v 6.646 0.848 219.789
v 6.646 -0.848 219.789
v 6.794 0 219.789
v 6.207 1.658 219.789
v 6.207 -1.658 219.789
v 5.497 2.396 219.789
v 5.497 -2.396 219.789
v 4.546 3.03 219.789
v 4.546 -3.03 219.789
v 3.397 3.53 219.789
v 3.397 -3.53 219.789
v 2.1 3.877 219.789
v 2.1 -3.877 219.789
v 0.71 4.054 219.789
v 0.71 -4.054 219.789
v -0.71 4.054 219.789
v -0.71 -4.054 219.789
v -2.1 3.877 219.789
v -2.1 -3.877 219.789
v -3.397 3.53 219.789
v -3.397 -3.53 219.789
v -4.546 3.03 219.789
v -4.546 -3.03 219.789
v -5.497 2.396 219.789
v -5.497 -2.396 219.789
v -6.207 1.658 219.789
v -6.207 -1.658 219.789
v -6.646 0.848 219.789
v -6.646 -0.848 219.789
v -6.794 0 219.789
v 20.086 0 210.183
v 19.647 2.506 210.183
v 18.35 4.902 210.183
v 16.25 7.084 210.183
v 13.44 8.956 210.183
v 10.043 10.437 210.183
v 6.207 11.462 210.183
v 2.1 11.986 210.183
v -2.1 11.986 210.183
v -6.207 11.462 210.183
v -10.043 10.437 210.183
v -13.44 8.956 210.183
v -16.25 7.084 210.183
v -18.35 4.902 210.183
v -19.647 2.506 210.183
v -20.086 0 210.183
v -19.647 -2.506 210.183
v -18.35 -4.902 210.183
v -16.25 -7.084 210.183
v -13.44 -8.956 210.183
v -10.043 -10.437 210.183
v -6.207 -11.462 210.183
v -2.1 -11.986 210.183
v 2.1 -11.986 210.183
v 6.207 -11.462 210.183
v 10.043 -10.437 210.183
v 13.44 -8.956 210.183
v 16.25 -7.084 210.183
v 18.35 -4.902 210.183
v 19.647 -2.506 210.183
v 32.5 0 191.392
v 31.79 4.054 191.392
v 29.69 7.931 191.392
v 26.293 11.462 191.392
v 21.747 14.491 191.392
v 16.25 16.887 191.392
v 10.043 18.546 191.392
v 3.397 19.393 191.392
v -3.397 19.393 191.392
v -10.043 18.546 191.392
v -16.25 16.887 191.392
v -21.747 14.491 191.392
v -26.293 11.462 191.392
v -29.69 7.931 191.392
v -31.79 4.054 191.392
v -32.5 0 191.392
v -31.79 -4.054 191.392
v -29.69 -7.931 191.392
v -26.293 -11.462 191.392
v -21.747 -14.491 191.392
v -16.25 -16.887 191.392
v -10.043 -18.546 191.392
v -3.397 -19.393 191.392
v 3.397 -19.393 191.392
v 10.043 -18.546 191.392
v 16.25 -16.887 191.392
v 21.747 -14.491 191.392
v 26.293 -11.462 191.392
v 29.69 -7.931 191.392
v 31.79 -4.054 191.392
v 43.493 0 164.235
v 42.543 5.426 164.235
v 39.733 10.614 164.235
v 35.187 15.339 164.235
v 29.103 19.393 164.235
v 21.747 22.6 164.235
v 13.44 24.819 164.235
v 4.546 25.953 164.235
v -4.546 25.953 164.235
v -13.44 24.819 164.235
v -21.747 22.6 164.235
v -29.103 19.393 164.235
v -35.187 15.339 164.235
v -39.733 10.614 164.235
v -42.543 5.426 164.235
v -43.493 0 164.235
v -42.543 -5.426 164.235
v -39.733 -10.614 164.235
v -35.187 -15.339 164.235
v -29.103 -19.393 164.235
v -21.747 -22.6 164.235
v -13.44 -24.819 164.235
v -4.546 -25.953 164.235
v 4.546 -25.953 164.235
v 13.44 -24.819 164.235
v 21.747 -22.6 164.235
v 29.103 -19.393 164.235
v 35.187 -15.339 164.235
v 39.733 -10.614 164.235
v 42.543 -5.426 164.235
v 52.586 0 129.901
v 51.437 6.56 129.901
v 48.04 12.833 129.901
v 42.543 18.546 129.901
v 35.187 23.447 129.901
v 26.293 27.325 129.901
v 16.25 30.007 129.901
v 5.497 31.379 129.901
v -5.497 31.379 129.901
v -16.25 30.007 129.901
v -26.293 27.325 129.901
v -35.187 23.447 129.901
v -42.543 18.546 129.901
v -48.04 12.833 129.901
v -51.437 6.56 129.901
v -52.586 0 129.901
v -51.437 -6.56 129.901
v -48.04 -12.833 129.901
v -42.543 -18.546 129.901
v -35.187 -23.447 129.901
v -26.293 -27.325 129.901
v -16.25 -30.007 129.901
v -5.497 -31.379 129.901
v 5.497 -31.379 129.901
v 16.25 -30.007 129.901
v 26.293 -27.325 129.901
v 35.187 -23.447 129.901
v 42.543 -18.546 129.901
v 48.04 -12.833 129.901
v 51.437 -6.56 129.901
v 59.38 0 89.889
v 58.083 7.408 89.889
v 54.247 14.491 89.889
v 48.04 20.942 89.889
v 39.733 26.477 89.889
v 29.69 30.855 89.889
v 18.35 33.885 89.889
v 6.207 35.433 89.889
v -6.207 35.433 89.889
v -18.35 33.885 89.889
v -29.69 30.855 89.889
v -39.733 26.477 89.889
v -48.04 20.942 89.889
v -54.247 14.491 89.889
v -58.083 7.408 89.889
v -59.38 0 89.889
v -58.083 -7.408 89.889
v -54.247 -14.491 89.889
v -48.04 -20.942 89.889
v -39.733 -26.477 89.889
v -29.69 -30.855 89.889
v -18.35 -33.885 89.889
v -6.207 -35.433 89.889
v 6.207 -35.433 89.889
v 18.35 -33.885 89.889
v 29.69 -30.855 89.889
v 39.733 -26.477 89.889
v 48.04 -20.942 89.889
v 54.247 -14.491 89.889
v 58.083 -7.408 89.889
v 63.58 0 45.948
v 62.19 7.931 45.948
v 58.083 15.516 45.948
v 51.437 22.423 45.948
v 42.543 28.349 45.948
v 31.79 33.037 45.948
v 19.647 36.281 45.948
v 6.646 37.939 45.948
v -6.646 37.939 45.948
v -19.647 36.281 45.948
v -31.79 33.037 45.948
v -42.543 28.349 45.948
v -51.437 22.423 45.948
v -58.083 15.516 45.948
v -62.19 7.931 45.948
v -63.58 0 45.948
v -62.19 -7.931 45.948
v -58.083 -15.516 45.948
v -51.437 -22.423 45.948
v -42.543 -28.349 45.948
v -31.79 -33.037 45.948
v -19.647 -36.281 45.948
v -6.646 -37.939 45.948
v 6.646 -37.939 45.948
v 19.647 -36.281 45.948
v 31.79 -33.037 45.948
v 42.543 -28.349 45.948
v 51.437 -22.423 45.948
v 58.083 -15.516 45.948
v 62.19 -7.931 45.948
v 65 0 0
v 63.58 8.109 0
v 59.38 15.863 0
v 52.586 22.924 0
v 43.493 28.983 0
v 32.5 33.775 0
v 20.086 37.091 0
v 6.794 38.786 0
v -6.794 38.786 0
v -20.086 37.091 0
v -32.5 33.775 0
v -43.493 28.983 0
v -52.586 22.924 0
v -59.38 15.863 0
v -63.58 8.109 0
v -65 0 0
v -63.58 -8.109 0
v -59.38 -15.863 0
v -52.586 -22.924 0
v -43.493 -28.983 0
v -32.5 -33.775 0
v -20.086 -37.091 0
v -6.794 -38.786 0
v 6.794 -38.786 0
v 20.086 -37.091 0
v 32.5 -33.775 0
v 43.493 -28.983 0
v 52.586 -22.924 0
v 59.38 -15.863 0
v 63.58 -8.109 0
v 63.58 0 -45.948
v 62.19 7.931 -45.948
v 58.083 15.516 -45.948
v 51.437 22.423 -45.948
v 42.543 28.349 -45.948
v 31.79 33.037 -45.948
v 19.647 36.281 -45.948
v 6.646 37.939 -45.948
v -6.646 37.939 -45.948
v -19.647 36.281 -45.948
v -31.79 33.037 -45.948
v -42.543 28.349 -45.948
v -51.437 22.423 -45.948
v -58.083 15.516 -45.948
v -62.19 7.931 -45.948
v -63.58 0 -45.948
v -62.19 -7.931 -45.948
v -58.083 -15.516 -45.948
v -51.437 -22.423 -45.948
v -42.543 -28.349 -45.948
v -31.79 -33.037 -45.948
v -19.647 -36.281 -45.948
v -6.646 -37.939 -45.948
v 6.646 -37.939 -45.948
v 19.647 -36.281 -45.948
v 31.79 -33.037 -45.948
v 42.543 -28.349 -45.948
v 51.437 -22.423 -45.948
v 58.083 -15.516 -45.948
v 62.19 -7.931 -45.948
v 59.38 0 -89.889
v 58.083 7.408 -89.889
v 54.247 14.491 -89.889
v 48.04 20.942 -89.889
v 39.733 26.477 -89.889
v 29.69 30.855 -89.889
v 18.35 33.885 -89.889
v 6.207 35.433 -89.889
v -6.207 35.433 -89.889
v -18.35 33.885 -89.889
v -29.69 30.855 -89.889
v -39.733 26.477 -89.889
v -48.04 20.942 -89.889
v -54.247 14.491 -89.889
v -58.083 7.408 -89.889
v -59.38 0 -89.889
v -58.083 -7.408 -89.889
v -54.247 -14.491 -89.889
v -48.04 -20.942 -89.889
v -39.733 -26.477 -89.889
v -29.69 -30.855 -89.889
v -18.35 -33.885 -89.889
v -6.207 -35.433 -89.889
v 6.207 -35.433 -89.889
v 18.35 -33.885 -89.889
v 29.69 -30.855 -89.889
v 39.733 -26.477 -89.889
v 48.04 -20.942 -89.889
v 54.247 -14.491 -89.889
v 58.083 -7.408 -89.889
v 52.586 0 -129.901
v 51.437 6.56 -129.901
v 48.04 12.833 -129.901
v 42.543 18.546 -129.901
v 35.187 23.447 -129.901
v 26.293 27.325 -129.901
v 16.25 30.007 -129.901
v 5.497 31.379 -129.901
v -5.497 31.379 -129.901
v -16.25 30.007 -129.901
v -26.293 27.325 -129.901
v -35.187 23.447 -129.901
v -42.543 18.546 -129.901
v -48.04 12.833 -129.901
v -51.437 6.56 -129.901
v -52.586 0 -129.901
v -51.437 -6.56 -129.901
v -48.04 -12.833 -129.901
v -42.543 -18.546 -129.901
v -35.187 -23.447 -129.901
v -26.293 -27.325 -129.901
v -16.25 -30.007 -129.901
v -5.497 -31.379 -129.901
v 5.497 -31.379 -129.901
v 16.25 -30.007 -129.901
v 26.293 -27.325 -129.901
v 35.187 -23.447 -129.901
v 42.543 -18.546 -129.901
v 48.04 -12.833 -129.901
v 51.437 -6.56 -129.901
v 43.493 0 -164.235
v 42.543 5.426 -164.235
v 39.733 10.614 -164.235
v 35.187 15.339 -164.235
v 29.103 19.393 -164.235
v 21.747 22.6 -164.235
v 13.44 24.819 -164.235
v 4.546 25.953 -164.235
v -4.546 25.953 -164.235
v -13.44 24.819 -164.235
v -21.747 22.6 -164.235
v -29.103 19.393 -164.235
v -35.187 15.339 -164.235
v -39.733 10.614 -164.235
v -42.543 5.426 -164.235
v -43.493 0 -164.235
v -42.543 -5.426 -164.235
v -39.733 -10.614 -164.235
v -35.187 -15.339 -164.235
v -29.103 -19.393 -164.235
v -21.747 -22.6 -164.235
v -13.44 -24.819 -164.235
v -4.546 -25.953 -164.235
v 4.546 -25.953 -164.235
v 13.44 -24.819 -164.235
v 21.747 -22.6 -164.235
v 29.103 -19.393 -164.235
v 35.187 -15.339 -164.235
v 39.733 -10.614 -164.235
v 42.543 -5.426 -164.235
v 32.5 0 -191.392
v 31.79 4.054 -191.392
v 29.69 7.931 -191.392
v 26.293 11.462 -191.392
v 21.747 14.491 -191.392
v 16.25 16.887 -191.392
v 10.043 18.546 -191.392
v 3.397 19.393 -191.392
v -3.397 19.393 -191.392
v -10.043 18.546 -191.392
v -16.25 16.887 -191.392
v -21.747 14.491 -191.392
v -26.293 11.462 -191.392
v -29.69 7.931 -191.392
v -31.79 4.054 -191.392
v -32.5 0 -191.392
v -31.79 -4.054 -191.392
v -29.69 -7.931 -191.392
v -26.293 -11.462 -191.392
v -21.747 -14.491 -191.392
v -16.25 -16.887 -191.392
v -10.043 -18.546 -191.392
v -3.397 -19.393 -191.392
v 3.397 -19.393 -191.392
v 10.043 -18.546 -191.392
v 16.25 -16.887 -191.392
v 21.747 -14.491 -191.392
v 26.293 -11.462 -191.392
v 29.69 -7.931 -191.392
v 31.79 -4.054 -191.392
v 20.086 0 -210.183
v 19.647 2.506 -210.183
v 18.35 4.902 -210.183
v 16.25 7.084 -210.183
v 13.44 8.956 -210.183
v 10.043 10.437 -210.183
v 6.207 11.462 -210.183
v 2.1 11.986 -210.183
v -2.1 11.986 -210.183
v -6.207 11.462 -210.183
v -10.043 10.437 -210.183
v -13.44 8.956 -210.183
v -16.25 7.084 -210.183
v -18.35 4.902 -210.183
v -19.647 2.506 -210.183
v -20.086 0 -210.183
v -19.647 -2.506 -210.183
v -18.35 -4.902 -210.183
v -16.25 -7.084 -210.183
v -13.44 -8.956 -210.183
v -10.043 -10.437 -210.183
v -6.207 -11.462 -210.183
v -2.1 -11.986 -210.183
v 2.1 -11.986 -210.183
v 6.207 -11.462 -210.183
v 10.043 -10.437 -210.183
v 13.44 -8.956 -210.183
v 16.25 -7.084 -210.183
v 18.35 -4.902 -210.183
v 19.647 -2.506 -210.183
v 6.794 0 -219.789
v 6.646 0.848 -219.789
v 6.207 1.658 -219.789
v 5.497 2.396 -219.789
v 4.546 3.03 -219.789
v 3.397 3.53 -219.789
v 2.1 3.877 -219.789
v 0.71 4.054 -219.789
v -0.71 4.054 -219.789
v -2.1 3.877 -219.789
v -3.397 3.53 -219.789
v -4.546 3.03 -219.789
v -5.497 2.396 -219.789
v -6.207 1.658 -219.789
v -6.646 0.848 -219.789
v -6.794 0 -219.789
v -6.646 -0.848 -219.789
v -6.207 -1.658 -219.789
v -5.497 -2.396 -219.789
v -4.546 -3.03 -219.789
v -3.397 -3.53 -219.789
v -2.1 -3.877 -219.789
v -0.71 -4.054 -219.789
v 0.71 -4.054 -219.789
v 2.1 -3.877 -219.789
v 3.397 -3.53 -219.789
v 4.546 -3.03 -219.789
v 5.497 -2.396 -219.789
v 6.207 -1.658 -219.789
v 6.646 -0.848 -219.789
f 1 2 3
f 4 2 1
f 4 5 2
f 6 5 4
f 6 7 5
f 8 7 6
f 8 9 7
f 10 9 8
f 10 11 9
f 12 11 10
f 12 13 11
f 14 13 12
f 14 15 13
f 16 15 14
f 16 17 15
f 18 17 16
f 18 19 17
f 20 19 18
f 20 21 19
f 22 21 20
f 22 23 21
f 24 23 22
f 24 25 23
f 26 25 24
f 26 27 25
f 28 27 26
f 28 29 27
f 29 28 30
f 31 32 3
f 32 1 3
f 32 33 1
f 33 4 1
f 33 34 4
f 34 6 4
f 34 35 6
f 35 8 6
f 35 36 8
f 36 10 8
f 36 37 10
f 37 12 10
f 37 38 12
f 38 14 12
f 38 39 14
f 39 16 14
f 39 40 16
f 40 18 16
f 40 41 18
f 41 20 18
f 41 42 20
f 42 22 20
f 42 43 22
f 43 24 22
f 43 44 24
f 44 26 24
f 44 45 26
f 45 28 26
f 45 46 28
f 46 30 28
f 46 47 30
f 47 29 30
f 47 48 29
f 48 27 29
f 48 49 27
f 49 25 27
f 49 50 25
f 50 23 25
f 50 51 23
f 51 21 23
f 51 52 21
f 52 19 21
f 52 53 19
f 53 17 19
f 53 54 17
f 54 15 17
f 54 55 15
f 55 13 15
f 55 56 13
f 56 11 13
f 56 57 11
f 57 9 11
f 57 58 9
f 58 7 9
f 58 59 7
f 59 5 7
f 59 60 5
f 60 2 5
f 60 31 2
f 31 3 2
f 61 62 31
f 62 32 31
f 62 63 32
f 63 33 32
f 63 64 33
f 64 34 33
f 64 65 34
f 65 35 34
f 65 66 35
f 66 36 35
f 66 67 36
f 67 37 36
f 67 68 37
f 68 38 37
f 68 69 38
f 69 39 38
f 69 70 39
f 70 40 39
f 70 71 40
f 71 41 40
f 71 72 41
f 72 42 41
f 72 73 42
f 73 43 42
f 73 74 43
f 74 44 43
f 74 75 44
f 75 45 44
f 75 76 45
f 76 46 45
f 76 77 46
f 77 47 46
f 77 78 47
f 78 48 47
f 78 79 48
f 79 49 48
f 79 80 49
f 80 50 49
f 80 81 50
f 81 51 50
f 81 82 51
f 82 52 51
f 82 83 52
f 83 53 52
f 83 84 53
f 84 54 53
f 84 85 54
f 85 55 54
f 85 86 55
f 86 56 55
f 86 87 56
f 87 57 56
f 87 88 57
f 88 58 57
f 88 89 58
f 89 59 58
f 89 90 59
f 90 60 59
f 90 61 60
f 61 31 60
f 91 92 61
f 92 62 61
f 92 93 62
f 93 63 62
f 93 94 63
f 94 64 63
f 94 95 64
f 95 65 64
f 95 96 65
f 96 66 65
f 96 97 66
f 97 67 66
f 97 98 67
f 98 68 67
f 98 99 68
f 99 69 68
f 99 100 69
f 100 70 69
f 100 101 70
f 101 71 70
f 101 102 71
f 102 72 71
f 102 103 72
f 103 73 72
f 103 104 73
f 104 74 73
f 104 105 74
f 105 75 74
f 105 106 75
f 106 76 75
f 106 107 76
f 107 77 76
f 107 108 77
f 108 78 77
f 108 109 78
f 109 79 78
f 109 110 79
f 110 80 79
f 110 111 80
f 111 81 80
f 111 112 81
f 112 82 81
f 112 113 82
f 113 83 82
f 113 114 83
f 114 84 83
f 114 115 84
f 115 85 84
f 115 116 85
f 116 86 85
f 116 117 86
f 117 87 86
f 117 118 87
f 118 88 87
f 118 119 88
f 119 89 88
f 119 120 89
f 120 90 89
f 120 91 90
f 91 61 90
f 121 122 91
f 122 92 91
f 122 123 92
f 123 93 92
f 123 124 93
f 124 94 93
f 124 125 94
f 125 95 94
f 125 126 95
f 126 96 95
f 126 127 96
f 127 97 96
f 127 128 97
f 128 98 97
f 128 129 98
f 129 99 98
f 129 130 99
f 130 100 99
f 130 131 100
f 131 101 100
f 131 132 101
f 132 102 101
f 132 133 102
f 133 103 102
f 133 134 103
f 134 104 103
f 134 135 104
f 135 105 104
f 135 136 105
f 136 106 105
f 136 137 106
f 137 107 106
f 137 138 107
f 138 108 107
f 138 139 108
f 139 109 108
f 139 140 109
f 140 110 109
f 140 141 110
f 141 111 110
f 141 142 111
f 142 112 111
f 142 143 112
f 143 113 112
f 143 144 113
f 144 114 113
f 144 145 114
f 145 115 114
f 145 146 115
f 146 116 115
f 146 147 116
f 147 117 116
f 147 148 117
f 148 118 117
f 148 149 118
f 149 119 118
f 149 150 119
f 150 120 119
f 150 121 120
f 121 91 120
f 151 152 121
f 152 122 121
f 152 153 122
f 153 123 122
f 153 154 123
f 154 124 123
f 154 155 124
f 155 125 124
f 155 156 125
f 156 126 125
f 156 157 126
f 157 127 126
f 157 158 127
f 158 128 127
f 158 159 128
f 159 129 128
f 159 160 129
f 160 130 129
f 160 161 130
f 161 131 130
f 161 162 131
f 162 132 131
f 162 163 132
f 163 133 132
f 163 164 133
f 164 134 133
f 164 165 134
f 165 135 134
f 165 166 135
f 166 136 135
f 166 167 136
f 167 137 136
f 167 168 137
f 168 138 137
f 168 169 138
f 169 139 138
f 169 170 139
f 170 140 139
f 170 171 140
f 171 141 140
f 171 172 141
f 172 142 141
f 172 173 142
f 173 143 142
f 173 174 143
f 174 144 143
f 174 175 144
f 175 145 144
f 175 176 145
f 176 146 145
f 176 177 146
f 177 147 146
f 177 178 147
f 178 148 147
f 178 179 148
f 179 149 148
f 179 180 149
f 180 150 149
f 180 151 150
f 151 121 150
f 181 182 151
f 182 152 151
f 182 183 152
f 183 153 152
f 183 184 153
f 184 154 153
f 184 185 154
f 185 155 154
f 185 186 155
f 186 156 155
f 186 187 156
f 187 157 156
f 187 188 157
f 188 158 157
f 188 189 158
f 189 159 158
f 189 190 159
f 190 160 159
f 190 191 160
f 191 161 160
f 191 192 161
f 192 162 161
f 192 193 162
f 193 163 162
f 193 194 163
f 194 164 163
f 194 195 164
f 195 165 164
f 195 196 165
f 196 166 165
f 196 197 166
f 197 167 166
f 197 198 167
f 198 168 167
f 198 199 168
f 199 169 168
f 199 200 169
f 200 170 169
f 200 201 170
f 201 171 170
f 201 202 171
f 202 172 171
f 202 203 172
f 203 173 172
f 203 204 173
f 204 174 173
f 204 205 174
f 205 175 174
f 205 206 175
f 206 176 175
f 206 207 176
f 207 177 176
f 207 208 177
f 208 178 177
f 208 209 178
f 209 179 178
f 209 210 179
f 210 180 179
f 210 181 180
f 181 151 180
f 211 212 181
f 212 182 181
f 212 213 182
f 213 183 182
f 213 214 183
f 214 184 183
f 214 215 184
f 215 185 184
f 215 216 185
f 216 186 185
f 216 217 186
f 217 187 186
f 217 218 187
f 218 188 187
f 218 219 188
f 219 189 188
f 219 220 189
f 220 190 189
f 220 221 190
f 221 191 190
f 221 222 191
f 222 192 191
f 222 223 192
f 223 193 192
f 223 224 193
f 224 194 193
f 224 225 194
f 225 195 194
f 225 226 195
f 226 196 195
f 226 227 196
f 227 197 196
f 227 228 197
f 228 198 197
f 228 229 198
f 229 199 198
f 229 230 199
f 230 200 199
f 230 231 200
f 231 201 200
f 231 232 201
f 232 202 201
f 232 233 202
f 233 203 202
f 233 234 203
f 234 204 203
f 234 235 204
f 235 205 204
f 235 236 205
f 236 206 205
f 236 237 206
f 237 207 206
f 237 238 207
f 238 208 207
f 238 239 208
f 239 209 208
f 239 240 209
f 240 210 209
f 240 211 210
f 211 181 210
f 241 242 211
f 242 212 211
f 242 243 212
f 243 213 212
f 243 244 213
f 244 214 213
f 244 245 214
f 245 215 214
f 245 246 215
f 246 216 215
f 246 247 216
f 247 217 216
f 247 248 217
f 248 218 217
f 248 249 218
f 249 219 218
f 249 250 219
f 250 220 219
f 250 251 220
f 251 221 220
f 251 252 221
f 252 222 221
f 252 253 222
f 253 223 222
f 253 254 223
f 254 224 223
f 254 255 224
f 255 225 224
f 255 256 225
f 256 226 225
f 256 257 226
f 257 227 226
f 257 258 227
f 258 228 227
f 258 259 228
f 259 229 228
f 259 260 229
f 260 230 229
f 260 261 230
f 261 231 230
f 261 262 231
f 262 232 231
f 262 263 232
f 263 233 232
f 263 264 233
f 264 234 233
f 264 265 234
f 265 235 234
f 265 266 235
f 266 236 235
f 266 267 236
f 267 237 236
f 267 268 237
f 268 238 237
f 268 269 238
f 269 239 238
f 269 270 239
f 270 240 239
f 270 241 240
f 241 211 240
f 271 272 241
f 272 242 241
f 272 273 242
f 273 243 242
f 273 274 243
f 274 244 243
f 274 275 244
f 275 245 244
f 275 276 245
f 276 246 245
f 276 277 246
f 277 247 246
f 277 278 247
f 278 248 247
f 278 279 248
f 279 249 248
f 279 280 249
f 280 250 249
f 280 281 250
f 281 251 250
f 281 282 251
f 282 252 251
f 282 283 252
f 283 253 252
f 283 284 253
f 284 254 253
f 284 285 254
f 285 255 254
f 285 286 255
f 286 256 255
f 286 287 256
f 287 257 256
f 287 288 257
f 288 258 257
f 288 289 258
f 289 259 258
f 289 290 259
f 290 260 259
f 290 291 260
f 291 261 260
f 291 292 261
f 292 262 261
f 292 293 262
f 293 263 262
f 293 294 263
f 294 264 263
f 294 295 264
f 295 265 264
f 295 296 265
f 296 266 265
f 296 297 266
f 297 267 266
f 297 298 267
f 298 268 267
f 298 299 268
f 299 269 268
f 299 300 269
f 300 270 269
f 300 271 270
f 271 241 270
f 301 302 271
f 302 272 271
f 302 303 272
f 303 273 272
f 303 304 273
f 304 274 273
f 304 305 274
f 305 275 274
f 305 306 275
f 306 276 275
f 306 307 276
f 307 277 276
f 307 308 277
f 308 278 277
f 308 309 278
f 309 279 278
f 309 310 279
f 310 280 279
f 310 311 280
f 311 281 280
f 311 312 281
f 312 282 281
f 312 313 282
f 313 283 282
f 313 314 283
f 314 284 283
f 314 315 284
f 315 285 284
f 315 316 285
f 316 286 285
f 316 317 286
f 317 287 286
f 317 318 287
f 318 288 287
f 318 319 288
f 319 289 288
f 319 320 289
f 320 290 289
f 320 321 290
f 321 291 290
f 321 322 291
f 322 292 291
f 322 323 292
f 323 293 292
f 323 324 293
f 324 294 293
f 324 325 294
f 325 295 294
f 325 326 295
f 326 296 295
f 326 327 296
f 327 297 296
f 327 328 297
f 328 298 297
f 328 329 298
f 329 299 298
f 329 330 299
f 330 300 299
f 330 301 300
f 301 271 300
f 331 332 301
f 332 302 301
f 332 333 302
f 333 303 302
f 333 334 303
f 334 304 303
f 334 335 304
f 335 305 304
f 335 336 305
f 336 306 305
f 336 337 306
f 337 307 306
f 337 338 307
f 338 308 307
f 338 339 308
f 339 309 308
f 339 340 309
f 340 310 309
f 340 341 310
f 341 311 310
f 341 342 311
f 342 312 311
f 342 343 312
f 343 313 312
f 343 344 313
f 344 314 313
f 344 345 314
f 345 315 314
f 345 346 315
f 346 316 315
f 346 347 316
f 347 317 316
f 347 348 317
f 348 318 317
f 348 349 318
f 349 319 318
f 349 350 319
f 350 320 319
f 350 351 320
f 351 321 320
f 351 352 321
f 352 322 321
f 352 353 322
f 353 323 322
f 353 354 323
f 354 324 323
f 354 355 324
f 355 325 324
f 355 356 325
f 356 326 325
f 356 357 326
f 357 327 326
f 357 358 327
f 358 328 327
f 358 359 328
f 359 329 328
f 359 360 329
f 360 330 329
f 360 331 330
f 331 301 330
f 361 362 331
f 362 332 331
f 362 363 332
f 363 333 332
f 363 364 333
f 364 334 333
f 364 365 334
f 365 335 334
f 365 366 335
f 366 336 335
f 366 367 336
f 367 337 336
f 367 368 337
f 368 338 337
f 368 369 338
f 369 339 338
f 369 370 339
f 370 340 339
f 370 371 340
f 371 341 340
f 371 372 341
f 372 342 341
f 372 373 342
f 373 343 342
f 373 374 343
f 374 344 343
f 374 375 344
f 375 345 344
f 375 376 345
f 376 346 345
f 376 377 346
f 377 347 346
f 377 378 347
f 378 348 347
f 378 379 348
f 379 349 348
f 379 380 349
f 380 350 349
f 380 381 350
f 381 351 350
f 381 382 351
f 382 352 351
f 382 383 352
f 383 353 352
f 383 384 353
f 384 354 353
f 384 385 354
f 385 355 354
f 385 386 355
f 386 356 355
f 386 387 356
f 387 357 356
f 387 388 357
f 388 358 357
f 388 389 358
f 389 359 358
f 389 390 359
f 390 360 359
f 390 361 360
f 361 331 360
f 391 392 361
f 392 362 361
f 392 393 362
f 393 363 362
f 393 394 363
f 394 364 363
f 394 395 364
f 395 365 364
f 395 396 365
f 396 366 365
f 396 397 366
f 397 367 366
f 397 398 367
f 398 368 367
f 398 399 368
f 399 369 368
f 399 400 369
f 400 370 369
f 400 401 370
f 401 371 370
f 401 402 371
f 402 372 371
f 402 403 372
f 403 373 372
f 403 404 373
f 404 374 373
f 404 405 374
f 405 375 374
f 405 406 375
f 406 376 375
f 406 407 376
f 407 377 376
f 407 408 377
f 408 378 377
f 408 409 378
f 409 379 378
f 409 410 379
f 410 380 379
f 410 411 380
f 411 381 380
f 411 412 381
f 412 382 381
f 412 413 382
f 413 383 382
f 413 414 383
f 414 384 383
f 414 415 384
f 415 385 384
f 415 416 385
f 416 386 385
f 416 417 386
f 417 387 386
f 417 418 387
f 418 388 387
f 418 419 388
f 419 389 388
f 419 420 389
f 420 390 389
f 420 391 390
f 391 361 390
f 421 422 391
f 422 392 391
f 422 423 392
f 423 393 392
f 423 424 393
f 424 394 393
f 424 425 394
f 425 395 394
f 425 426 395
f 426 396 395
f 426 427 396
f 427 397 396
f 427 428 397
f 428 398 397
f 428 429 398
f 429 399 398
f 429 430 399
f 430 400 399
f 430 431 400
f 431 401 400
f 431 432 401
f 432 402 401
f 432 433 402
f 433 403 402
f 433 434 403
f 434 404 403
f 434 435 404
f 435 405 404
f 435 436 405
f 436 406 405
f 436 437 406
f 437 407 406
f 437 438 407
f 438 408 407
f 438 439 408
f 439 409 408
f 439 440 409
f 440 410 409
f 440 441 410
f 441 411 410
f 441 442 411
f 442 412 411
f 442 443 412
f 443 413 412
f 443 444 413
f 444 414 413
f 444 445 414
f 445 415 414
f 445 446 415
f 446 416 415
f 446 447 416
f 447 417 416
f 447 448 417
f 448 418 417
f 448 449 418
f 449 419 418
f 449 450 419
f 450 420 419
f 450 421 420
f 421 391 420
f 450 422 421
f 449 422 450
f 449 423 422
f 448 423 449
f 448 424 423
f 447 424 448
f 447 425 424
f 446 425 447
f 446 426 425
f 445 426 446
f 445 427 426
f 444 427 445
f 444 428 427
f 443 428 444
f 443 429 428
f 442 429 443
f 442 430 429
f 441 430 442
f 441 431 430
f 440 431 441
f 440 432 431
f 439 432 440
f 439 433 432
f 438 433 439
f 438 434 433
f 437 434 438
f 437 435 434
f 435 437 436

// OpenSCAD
// Generated by SolidPython 1.0.1 on 2020-07-29 00:46:46


scale(v = [5, 3, 17]) {
	sphere(r = 13);
}
/***********************************************
*********      SolidPython code:      **********
************************************************
 
# import packages: SolidPython
from solid import *
from solid.utils import *
from itertools import chain, combinations, permutations


class Resize:

    def __init__(self, scad_file):
        self.scad_file = scad_file
        #self.scad_file = import_scad(scad_file)
        # cone/cylinder param:
        self.r1 = 0
        self.r2 = 0
        self.h = 0
        # rectangular prism param:
        self.w = 0
        self.l = 0
        # ellipse param:
        self.r = 0

    # import OpenScad code (file name corresponds to shape)


    # classify shape + parameters
    def assign(self, param1, param2, param3):
        if self.scad_file == 'cone.scad':
            self.r1 = param1
            self.r2 = param2
            self.h = param3
        elif self.scad_file == 'cylinder.scad':
            self.r1 = param1
            self.r2 = param2
            self.h = param3
        elif self.scad_file == 'rectangularPrism.scad':
            self.h = param1
            self.l = param2
            self.w = param3
        else:
            self.r = param1
            self.h = param2

    # resize parameters
    def iterate(self):
        x = range(3, 20, 2)
        i = 1
        if self.scad_file == 'cone.scad':
            tempList = list(permutations(x, 2))
            for temp in tempList:
                param1 = temp[0]
                param2 = temp[1]
                filepath = 'produced_scad_files/' + 'cone' + str(param1) + '_' + str(param2) + '_' + '.scad'
                scad_render_to_file(cylinder(h=param1, r1=param2, r2=0), filepath)

        elif self.scad_file == 'cylinder.scad':
            tempList = list(permutations(x, 3))
            for temp in tempList:
                param1 = temp[0]
                param2 = temp[1]
                filepath = 'produced_scad_files/' + 'cylinder' + str(param1) + '_' + str(param2) + '_' + '.scad'
                scad_render_to_file(cylinder(h=param1, r1=param2, r2=param2), filepath)

        elif self.scad_file == 'rectangularPrism.scad':
            tempList = list(permutations(x, 3))
            for temp in tempList:
                param1 = temp[0]
                param2 = temp[1]
                param3 = temp[2]
                filepath = 'produced_scad_files/' + 'rectangularPrism' + str(param1) + '_' + str(param2) + '_' + str(
                    param3) + '.scad'
                scad_render_to_file(cube(size=(param1, param2, param3)), filepath)

        elif self.scad_file == 'ellipse.scad':
            tempList = list(permutations(x, 4))
            for temp in tempList:
                param1 = temp[0]
                param2 = temp[1]
                param3 = temp[2]
                param4 = temp[3]
                filepath = 'produced_scad_files/' + 'ellipse' + str(param1) + '_' + str(param2) + '_' + str(param3) + '_' + str(param4) + '.scad'
                scad_render_to_file(scale([param1, param2, param3])(sphere(r=param4)), filepath)

    def render_to_scadfile(self):
        scad_render_to_file(scad, 'example.scad') 
 
************************************************/
